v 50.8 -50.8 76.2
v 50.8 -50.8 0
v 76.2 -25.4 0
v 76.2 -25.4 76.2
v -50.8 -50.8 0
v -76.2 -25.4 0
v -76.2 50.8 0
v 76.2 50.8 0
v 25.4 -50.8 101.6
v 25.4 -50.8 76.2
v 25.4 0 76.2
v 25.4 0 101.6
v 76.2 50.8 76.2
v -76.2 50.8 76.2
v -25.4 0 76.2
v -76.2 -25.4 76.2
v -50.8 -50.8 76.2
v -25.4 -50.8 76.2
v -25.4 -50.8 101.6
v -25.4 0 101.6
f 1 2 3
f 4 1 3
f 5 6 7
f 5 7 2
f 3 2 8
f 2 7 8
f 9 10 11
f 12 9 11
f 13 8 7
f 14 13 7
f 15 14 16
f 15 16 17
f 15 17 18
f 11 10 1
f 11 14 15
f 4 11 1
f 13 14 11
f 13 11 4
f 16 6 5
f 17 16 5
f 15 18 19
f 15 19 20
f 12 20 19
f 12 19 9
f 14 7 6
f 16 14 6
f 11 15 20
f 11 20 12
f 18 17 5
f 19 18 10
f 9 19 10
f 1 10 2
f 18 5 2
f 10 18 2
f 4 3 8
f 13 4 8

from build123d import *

# Parameters (mm, degrees)
F1_DEPTH = 76.2
F3_W     = 50.8
F3_H     = 50.8
F4_DEPTH = 25.4


with BuildPart() as f1:
    # F0 (on Top) → F1 (new body)
    with BuildSketch(Plane.XY):
        Polygon((76.2, 50.8), (-76.2, 50.8), (-76.2, -25.4), (-50.8, -50.8), (50.8, -50.8), (76.2, -25.4), align=None)
    extrude(amount=F1_DEPTH)

    # F3 (on offset) → F4 (join)
    with BuildSketch(Plane.XY.offset(76.2)):
        with Locations((0, -25.4)):
            Rectangle(F3_W, F3_H)
    extrude(amount=F4_DEPTH)


solid = f1.part
